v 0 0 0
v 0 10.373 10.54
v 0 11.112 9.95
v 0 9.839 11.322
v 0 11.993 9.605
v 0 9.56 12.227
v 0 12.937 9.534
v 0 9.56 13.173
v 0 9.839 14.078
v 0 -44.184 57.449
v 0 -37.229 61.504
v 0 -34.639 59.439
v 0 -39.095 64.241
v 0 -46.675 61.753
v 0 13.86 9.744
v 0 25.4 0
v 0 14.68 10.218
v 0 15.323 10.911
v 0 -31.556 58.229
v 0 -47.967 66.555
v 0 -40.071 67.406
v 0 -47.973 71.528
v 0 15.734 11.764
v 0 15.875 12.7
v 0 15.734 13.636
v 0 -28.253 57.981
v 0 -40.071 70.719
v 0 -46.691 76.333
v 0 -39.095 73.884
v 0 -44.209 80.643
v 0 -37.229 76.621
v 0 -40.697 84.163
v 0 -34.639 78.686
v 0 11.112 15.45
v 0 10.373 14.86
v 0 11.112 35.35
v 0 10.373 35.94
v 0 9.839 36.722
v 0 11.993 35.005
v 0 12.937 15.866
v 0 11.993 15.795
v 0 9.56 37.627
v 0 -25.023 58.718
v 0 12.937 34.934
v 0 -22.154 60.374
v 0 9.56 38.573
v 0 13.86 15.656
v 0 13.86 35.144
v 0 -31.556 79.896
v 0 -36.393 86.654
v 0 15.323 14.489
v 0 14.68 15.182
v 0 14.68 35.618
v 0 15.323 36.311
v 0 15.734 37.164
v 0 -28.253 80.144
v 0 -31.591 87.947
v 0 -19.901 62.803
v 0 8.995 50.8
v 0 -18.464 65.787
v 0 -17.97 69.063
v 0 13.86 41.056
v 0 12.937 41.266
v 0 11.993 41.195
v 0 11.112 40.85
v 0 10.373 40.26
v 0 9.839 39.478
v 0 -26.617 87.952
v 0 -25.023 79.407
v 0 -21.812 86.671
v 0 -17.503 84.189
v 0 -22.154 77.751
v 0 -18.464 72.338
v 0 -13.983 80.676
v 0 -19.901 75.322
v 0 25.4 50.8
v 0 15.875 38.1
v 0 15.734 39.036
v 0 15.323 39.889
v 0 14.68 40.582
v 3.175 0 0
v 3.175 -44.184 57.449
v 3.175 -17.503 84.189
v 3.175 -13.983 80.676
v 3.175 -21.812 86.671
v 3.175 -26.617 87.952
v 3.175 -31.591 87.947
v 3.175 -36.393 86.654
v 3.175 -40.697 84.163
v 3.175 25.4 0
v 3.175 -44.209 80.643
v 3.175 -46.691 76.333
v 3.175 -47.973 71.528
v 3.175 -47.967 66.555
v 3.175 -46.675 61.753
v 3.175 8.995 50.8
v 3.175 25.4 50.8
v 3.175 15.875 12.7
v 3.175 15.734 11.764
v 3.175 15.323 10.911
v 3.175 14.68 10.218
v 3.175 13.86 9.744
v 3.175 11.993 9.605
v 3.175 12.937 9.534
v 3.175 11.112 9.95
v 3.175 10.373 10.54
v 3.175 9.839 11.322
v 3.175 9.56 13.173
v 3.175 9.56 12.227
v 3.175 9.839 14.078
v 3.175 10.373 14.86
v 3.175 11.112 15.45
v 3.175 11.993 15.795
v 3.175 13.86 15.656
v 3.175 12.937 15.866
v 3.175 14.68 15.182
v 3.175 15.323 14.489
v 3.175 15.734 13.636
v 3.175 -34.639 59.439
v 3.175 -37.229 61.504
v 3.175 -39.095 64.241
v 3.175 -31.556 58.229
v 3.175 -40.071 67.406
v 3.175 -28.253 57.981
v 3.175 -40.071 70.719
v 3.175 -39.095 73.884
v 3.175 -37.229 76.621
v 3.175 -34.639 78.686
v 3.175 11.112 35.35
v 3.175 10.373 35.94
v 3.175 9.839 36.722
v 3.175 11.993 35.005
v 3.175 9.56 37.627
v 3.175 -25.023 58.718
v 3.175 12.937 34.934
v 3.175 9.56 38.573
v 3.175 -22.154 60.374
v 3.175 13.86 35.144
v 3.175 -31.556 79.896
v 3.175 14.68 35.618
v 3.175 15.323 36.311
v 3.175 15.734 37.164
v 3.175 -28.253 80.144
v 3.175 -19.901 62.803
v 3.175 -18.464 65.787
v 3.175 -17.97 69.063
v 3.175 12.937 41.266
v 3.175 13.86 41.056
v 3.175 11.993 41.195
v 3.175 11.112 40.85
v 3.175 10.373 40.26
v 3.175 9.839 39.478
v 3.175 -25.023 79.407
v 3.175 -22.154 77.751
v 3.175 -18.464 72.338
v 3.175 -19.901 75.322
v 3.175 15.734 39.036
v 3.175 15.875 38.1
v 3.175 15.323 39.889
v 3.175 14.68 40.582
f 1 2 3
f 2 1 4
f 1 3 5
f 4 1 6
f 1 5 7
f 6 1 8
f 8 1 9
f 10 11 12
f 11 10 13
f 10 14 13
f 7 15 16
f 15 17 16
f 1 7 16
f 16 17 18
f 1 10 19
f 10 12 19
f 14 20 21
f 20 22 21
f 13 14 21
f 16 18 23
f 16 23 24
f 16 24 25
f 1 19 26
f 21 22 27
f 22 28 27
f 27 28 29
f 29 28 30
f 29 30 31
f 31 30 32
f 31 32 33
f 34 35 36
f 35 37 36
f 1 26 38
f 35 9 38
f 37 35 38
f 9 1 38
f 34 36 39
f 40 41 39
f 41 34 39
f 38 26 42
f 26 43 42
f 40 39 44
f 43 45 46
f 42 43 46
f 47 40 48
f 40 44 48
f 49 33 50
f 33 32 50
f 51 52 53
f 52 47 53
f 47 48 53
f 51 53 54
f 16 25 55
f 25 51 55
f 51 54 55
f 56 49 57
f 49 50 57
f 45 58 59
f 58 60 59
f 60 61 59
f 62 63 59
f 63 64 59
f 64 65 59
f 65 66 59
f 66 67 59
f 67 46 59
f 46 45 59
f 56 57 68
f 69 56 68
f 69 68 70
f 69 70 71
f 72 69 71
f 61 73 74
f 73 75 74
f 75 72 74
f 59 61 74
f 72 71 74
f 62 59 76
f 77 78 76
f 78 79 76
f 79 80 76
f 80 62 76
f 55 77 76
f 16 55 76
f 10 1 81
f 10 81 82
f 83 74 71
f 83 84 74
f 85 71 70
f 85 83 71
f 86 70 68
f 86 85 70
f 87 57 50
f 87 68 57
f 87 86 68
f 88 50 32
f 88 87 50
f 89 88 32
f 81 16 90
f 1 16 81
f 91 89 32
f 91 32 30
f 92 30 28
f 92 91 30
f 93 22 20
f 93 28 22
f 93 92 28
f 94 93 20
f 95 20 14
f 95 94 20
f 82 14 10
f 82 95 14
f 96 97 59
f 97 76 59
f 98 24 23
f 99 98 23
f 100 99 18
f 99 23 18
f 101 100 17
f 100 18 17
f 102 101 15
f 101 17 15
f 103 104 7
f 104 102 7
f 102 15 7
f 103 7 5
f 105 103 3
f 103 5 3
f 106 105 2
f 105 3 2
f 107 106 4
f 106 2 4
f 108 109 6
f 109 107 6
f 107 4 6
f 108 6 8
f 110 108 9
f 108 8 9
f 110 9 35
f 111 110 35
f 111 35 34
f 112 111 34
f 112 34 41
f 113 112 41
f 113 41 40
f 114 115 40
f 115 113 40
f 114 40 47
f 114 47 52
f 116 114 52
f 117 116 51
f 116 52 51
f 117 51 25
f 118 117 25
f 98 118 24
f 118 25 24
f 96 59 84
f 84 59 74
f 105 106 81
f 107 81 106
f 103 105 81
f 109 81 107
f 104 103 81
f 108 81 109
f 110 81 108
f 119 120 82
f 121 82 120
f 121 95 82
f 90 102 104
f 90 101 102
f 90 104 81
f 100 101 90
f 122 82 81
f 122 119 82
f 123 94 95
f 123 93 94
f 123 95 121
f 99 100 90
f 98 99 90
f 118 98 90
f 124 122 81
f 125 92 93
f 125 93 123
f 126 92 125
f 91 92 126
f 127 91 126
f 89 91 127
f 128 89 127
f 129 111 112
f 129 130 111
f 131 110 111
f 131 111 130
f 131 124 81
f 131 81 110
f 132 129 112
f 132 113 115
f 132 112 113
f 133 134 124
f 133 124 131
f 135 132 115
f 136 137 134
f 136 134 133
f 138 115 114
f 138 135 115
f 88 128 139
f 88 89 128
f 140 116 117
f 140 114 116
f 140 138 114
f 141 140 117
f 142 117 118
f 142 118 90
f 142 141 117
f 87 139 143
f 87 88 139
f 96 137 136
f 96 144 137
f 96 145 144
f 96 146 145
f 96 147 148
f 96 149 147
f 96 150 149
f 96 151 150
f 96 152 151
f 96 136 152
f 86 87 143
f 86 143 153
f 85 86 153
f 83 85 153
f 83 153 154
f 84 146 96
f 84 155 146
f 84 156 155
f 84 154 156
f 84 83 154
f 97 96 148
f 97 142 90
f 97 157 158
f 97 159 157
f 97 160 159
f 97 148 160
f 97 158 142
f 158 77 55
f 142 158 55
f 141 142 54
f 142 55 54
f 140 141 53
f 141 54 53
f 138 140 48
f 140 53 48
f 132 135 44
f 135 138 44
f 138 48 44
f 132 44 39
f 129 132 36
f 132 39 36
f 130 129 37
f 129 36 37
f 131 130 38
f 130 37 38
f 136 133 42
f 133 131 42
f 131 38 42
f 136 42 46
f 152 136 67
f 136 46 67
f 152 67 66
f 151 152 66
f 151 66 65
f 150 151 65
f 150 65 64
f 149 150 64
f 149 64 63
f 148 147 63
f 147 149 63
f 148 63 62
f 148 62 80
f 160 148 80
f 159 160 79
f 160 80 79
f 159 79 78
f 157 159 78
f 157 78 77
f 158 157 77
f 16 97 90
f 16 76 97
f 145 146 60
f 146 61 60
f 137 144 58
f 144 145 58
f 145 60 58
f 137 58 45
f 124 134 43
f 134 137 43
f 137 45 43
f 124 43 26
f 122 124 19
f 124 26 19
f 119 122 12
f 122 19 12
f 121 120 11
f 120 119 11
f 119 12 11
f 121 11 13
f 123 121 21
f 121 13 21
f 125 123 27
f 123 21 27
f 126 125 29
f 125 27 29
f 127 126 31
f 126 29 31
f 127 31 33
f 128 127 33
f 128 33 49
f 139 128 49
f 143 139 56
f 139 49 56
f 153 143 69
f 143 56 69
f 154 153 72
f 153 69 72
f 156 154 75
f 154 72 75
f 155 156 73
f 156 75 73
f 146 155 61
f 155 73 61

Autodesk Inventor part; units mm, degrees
ref_plane "YZ Plane" through (0, 0, 0) normal (1, 0, 0) x (0, 1, 0)
ref_plane "XZ Plane" through (0, 0, 0) normal (0, 1, 0) x (-1, 0, 0)
ref_plane "XY Plane" through (0, 0, 0) normal (0, 0, 1) x (1, 0, 0)
sketch "Sketch1" plane through (0, 0, 0) normal (1, 0, 0) x (0, 1, 0)
  line L0 (25.4, 50.8) -> (25.4, 0)
  line L1 (25.4, 0) -> (0, 0)
  line L2 (0, 0) -> (-55.7972, 72.5494)
  line L3 (25.4, 50.8) -> (8.9951, 50.8)
  line L4 (8.9951, 50.8) -> (-25.5962, 95.7768)
  line L5 (-25.5962, 95.7768) -> (-55.7972, 72.5494)
  circle A0 centre (-29.083, 69.0626) radius 11.1125
  line L6 (-40.6967, 84.1631) -> (-29.083, 69.0626) construction
  line L7 (25.4, 25.4) -> (-19.5349, 25.4) construction
  line L8 (12.7, 0) -> (12.7, 50.8) construction
  circle A1 centre (12.7, 12.7) radius 3.175
  circle A2 centre (12.7, 38.1) radius 3.175
  dimension "d9" = 38.1
  dimension "d10" = 19.05
  dimension "d11" = 50.8
  dimension "d12" = 29.083
  dimension "d13" = 43.6626
  dimension "d14" = 25.4
  dimension "d16" = 22.225
  dimension "d17" = 6.35
  dimension "d18" = 12.7
  dimension "d19" = 25.4
extrude "Extrusion1" add sketch "Sketch1" along normal blind 3.175
fillet "Fillet1" radius 19.05 2 edges at (1.5875, -25.5962, 95.7768) (1.5875, -55.7972, 72.5494)
properties part number "Rear roller plate"
